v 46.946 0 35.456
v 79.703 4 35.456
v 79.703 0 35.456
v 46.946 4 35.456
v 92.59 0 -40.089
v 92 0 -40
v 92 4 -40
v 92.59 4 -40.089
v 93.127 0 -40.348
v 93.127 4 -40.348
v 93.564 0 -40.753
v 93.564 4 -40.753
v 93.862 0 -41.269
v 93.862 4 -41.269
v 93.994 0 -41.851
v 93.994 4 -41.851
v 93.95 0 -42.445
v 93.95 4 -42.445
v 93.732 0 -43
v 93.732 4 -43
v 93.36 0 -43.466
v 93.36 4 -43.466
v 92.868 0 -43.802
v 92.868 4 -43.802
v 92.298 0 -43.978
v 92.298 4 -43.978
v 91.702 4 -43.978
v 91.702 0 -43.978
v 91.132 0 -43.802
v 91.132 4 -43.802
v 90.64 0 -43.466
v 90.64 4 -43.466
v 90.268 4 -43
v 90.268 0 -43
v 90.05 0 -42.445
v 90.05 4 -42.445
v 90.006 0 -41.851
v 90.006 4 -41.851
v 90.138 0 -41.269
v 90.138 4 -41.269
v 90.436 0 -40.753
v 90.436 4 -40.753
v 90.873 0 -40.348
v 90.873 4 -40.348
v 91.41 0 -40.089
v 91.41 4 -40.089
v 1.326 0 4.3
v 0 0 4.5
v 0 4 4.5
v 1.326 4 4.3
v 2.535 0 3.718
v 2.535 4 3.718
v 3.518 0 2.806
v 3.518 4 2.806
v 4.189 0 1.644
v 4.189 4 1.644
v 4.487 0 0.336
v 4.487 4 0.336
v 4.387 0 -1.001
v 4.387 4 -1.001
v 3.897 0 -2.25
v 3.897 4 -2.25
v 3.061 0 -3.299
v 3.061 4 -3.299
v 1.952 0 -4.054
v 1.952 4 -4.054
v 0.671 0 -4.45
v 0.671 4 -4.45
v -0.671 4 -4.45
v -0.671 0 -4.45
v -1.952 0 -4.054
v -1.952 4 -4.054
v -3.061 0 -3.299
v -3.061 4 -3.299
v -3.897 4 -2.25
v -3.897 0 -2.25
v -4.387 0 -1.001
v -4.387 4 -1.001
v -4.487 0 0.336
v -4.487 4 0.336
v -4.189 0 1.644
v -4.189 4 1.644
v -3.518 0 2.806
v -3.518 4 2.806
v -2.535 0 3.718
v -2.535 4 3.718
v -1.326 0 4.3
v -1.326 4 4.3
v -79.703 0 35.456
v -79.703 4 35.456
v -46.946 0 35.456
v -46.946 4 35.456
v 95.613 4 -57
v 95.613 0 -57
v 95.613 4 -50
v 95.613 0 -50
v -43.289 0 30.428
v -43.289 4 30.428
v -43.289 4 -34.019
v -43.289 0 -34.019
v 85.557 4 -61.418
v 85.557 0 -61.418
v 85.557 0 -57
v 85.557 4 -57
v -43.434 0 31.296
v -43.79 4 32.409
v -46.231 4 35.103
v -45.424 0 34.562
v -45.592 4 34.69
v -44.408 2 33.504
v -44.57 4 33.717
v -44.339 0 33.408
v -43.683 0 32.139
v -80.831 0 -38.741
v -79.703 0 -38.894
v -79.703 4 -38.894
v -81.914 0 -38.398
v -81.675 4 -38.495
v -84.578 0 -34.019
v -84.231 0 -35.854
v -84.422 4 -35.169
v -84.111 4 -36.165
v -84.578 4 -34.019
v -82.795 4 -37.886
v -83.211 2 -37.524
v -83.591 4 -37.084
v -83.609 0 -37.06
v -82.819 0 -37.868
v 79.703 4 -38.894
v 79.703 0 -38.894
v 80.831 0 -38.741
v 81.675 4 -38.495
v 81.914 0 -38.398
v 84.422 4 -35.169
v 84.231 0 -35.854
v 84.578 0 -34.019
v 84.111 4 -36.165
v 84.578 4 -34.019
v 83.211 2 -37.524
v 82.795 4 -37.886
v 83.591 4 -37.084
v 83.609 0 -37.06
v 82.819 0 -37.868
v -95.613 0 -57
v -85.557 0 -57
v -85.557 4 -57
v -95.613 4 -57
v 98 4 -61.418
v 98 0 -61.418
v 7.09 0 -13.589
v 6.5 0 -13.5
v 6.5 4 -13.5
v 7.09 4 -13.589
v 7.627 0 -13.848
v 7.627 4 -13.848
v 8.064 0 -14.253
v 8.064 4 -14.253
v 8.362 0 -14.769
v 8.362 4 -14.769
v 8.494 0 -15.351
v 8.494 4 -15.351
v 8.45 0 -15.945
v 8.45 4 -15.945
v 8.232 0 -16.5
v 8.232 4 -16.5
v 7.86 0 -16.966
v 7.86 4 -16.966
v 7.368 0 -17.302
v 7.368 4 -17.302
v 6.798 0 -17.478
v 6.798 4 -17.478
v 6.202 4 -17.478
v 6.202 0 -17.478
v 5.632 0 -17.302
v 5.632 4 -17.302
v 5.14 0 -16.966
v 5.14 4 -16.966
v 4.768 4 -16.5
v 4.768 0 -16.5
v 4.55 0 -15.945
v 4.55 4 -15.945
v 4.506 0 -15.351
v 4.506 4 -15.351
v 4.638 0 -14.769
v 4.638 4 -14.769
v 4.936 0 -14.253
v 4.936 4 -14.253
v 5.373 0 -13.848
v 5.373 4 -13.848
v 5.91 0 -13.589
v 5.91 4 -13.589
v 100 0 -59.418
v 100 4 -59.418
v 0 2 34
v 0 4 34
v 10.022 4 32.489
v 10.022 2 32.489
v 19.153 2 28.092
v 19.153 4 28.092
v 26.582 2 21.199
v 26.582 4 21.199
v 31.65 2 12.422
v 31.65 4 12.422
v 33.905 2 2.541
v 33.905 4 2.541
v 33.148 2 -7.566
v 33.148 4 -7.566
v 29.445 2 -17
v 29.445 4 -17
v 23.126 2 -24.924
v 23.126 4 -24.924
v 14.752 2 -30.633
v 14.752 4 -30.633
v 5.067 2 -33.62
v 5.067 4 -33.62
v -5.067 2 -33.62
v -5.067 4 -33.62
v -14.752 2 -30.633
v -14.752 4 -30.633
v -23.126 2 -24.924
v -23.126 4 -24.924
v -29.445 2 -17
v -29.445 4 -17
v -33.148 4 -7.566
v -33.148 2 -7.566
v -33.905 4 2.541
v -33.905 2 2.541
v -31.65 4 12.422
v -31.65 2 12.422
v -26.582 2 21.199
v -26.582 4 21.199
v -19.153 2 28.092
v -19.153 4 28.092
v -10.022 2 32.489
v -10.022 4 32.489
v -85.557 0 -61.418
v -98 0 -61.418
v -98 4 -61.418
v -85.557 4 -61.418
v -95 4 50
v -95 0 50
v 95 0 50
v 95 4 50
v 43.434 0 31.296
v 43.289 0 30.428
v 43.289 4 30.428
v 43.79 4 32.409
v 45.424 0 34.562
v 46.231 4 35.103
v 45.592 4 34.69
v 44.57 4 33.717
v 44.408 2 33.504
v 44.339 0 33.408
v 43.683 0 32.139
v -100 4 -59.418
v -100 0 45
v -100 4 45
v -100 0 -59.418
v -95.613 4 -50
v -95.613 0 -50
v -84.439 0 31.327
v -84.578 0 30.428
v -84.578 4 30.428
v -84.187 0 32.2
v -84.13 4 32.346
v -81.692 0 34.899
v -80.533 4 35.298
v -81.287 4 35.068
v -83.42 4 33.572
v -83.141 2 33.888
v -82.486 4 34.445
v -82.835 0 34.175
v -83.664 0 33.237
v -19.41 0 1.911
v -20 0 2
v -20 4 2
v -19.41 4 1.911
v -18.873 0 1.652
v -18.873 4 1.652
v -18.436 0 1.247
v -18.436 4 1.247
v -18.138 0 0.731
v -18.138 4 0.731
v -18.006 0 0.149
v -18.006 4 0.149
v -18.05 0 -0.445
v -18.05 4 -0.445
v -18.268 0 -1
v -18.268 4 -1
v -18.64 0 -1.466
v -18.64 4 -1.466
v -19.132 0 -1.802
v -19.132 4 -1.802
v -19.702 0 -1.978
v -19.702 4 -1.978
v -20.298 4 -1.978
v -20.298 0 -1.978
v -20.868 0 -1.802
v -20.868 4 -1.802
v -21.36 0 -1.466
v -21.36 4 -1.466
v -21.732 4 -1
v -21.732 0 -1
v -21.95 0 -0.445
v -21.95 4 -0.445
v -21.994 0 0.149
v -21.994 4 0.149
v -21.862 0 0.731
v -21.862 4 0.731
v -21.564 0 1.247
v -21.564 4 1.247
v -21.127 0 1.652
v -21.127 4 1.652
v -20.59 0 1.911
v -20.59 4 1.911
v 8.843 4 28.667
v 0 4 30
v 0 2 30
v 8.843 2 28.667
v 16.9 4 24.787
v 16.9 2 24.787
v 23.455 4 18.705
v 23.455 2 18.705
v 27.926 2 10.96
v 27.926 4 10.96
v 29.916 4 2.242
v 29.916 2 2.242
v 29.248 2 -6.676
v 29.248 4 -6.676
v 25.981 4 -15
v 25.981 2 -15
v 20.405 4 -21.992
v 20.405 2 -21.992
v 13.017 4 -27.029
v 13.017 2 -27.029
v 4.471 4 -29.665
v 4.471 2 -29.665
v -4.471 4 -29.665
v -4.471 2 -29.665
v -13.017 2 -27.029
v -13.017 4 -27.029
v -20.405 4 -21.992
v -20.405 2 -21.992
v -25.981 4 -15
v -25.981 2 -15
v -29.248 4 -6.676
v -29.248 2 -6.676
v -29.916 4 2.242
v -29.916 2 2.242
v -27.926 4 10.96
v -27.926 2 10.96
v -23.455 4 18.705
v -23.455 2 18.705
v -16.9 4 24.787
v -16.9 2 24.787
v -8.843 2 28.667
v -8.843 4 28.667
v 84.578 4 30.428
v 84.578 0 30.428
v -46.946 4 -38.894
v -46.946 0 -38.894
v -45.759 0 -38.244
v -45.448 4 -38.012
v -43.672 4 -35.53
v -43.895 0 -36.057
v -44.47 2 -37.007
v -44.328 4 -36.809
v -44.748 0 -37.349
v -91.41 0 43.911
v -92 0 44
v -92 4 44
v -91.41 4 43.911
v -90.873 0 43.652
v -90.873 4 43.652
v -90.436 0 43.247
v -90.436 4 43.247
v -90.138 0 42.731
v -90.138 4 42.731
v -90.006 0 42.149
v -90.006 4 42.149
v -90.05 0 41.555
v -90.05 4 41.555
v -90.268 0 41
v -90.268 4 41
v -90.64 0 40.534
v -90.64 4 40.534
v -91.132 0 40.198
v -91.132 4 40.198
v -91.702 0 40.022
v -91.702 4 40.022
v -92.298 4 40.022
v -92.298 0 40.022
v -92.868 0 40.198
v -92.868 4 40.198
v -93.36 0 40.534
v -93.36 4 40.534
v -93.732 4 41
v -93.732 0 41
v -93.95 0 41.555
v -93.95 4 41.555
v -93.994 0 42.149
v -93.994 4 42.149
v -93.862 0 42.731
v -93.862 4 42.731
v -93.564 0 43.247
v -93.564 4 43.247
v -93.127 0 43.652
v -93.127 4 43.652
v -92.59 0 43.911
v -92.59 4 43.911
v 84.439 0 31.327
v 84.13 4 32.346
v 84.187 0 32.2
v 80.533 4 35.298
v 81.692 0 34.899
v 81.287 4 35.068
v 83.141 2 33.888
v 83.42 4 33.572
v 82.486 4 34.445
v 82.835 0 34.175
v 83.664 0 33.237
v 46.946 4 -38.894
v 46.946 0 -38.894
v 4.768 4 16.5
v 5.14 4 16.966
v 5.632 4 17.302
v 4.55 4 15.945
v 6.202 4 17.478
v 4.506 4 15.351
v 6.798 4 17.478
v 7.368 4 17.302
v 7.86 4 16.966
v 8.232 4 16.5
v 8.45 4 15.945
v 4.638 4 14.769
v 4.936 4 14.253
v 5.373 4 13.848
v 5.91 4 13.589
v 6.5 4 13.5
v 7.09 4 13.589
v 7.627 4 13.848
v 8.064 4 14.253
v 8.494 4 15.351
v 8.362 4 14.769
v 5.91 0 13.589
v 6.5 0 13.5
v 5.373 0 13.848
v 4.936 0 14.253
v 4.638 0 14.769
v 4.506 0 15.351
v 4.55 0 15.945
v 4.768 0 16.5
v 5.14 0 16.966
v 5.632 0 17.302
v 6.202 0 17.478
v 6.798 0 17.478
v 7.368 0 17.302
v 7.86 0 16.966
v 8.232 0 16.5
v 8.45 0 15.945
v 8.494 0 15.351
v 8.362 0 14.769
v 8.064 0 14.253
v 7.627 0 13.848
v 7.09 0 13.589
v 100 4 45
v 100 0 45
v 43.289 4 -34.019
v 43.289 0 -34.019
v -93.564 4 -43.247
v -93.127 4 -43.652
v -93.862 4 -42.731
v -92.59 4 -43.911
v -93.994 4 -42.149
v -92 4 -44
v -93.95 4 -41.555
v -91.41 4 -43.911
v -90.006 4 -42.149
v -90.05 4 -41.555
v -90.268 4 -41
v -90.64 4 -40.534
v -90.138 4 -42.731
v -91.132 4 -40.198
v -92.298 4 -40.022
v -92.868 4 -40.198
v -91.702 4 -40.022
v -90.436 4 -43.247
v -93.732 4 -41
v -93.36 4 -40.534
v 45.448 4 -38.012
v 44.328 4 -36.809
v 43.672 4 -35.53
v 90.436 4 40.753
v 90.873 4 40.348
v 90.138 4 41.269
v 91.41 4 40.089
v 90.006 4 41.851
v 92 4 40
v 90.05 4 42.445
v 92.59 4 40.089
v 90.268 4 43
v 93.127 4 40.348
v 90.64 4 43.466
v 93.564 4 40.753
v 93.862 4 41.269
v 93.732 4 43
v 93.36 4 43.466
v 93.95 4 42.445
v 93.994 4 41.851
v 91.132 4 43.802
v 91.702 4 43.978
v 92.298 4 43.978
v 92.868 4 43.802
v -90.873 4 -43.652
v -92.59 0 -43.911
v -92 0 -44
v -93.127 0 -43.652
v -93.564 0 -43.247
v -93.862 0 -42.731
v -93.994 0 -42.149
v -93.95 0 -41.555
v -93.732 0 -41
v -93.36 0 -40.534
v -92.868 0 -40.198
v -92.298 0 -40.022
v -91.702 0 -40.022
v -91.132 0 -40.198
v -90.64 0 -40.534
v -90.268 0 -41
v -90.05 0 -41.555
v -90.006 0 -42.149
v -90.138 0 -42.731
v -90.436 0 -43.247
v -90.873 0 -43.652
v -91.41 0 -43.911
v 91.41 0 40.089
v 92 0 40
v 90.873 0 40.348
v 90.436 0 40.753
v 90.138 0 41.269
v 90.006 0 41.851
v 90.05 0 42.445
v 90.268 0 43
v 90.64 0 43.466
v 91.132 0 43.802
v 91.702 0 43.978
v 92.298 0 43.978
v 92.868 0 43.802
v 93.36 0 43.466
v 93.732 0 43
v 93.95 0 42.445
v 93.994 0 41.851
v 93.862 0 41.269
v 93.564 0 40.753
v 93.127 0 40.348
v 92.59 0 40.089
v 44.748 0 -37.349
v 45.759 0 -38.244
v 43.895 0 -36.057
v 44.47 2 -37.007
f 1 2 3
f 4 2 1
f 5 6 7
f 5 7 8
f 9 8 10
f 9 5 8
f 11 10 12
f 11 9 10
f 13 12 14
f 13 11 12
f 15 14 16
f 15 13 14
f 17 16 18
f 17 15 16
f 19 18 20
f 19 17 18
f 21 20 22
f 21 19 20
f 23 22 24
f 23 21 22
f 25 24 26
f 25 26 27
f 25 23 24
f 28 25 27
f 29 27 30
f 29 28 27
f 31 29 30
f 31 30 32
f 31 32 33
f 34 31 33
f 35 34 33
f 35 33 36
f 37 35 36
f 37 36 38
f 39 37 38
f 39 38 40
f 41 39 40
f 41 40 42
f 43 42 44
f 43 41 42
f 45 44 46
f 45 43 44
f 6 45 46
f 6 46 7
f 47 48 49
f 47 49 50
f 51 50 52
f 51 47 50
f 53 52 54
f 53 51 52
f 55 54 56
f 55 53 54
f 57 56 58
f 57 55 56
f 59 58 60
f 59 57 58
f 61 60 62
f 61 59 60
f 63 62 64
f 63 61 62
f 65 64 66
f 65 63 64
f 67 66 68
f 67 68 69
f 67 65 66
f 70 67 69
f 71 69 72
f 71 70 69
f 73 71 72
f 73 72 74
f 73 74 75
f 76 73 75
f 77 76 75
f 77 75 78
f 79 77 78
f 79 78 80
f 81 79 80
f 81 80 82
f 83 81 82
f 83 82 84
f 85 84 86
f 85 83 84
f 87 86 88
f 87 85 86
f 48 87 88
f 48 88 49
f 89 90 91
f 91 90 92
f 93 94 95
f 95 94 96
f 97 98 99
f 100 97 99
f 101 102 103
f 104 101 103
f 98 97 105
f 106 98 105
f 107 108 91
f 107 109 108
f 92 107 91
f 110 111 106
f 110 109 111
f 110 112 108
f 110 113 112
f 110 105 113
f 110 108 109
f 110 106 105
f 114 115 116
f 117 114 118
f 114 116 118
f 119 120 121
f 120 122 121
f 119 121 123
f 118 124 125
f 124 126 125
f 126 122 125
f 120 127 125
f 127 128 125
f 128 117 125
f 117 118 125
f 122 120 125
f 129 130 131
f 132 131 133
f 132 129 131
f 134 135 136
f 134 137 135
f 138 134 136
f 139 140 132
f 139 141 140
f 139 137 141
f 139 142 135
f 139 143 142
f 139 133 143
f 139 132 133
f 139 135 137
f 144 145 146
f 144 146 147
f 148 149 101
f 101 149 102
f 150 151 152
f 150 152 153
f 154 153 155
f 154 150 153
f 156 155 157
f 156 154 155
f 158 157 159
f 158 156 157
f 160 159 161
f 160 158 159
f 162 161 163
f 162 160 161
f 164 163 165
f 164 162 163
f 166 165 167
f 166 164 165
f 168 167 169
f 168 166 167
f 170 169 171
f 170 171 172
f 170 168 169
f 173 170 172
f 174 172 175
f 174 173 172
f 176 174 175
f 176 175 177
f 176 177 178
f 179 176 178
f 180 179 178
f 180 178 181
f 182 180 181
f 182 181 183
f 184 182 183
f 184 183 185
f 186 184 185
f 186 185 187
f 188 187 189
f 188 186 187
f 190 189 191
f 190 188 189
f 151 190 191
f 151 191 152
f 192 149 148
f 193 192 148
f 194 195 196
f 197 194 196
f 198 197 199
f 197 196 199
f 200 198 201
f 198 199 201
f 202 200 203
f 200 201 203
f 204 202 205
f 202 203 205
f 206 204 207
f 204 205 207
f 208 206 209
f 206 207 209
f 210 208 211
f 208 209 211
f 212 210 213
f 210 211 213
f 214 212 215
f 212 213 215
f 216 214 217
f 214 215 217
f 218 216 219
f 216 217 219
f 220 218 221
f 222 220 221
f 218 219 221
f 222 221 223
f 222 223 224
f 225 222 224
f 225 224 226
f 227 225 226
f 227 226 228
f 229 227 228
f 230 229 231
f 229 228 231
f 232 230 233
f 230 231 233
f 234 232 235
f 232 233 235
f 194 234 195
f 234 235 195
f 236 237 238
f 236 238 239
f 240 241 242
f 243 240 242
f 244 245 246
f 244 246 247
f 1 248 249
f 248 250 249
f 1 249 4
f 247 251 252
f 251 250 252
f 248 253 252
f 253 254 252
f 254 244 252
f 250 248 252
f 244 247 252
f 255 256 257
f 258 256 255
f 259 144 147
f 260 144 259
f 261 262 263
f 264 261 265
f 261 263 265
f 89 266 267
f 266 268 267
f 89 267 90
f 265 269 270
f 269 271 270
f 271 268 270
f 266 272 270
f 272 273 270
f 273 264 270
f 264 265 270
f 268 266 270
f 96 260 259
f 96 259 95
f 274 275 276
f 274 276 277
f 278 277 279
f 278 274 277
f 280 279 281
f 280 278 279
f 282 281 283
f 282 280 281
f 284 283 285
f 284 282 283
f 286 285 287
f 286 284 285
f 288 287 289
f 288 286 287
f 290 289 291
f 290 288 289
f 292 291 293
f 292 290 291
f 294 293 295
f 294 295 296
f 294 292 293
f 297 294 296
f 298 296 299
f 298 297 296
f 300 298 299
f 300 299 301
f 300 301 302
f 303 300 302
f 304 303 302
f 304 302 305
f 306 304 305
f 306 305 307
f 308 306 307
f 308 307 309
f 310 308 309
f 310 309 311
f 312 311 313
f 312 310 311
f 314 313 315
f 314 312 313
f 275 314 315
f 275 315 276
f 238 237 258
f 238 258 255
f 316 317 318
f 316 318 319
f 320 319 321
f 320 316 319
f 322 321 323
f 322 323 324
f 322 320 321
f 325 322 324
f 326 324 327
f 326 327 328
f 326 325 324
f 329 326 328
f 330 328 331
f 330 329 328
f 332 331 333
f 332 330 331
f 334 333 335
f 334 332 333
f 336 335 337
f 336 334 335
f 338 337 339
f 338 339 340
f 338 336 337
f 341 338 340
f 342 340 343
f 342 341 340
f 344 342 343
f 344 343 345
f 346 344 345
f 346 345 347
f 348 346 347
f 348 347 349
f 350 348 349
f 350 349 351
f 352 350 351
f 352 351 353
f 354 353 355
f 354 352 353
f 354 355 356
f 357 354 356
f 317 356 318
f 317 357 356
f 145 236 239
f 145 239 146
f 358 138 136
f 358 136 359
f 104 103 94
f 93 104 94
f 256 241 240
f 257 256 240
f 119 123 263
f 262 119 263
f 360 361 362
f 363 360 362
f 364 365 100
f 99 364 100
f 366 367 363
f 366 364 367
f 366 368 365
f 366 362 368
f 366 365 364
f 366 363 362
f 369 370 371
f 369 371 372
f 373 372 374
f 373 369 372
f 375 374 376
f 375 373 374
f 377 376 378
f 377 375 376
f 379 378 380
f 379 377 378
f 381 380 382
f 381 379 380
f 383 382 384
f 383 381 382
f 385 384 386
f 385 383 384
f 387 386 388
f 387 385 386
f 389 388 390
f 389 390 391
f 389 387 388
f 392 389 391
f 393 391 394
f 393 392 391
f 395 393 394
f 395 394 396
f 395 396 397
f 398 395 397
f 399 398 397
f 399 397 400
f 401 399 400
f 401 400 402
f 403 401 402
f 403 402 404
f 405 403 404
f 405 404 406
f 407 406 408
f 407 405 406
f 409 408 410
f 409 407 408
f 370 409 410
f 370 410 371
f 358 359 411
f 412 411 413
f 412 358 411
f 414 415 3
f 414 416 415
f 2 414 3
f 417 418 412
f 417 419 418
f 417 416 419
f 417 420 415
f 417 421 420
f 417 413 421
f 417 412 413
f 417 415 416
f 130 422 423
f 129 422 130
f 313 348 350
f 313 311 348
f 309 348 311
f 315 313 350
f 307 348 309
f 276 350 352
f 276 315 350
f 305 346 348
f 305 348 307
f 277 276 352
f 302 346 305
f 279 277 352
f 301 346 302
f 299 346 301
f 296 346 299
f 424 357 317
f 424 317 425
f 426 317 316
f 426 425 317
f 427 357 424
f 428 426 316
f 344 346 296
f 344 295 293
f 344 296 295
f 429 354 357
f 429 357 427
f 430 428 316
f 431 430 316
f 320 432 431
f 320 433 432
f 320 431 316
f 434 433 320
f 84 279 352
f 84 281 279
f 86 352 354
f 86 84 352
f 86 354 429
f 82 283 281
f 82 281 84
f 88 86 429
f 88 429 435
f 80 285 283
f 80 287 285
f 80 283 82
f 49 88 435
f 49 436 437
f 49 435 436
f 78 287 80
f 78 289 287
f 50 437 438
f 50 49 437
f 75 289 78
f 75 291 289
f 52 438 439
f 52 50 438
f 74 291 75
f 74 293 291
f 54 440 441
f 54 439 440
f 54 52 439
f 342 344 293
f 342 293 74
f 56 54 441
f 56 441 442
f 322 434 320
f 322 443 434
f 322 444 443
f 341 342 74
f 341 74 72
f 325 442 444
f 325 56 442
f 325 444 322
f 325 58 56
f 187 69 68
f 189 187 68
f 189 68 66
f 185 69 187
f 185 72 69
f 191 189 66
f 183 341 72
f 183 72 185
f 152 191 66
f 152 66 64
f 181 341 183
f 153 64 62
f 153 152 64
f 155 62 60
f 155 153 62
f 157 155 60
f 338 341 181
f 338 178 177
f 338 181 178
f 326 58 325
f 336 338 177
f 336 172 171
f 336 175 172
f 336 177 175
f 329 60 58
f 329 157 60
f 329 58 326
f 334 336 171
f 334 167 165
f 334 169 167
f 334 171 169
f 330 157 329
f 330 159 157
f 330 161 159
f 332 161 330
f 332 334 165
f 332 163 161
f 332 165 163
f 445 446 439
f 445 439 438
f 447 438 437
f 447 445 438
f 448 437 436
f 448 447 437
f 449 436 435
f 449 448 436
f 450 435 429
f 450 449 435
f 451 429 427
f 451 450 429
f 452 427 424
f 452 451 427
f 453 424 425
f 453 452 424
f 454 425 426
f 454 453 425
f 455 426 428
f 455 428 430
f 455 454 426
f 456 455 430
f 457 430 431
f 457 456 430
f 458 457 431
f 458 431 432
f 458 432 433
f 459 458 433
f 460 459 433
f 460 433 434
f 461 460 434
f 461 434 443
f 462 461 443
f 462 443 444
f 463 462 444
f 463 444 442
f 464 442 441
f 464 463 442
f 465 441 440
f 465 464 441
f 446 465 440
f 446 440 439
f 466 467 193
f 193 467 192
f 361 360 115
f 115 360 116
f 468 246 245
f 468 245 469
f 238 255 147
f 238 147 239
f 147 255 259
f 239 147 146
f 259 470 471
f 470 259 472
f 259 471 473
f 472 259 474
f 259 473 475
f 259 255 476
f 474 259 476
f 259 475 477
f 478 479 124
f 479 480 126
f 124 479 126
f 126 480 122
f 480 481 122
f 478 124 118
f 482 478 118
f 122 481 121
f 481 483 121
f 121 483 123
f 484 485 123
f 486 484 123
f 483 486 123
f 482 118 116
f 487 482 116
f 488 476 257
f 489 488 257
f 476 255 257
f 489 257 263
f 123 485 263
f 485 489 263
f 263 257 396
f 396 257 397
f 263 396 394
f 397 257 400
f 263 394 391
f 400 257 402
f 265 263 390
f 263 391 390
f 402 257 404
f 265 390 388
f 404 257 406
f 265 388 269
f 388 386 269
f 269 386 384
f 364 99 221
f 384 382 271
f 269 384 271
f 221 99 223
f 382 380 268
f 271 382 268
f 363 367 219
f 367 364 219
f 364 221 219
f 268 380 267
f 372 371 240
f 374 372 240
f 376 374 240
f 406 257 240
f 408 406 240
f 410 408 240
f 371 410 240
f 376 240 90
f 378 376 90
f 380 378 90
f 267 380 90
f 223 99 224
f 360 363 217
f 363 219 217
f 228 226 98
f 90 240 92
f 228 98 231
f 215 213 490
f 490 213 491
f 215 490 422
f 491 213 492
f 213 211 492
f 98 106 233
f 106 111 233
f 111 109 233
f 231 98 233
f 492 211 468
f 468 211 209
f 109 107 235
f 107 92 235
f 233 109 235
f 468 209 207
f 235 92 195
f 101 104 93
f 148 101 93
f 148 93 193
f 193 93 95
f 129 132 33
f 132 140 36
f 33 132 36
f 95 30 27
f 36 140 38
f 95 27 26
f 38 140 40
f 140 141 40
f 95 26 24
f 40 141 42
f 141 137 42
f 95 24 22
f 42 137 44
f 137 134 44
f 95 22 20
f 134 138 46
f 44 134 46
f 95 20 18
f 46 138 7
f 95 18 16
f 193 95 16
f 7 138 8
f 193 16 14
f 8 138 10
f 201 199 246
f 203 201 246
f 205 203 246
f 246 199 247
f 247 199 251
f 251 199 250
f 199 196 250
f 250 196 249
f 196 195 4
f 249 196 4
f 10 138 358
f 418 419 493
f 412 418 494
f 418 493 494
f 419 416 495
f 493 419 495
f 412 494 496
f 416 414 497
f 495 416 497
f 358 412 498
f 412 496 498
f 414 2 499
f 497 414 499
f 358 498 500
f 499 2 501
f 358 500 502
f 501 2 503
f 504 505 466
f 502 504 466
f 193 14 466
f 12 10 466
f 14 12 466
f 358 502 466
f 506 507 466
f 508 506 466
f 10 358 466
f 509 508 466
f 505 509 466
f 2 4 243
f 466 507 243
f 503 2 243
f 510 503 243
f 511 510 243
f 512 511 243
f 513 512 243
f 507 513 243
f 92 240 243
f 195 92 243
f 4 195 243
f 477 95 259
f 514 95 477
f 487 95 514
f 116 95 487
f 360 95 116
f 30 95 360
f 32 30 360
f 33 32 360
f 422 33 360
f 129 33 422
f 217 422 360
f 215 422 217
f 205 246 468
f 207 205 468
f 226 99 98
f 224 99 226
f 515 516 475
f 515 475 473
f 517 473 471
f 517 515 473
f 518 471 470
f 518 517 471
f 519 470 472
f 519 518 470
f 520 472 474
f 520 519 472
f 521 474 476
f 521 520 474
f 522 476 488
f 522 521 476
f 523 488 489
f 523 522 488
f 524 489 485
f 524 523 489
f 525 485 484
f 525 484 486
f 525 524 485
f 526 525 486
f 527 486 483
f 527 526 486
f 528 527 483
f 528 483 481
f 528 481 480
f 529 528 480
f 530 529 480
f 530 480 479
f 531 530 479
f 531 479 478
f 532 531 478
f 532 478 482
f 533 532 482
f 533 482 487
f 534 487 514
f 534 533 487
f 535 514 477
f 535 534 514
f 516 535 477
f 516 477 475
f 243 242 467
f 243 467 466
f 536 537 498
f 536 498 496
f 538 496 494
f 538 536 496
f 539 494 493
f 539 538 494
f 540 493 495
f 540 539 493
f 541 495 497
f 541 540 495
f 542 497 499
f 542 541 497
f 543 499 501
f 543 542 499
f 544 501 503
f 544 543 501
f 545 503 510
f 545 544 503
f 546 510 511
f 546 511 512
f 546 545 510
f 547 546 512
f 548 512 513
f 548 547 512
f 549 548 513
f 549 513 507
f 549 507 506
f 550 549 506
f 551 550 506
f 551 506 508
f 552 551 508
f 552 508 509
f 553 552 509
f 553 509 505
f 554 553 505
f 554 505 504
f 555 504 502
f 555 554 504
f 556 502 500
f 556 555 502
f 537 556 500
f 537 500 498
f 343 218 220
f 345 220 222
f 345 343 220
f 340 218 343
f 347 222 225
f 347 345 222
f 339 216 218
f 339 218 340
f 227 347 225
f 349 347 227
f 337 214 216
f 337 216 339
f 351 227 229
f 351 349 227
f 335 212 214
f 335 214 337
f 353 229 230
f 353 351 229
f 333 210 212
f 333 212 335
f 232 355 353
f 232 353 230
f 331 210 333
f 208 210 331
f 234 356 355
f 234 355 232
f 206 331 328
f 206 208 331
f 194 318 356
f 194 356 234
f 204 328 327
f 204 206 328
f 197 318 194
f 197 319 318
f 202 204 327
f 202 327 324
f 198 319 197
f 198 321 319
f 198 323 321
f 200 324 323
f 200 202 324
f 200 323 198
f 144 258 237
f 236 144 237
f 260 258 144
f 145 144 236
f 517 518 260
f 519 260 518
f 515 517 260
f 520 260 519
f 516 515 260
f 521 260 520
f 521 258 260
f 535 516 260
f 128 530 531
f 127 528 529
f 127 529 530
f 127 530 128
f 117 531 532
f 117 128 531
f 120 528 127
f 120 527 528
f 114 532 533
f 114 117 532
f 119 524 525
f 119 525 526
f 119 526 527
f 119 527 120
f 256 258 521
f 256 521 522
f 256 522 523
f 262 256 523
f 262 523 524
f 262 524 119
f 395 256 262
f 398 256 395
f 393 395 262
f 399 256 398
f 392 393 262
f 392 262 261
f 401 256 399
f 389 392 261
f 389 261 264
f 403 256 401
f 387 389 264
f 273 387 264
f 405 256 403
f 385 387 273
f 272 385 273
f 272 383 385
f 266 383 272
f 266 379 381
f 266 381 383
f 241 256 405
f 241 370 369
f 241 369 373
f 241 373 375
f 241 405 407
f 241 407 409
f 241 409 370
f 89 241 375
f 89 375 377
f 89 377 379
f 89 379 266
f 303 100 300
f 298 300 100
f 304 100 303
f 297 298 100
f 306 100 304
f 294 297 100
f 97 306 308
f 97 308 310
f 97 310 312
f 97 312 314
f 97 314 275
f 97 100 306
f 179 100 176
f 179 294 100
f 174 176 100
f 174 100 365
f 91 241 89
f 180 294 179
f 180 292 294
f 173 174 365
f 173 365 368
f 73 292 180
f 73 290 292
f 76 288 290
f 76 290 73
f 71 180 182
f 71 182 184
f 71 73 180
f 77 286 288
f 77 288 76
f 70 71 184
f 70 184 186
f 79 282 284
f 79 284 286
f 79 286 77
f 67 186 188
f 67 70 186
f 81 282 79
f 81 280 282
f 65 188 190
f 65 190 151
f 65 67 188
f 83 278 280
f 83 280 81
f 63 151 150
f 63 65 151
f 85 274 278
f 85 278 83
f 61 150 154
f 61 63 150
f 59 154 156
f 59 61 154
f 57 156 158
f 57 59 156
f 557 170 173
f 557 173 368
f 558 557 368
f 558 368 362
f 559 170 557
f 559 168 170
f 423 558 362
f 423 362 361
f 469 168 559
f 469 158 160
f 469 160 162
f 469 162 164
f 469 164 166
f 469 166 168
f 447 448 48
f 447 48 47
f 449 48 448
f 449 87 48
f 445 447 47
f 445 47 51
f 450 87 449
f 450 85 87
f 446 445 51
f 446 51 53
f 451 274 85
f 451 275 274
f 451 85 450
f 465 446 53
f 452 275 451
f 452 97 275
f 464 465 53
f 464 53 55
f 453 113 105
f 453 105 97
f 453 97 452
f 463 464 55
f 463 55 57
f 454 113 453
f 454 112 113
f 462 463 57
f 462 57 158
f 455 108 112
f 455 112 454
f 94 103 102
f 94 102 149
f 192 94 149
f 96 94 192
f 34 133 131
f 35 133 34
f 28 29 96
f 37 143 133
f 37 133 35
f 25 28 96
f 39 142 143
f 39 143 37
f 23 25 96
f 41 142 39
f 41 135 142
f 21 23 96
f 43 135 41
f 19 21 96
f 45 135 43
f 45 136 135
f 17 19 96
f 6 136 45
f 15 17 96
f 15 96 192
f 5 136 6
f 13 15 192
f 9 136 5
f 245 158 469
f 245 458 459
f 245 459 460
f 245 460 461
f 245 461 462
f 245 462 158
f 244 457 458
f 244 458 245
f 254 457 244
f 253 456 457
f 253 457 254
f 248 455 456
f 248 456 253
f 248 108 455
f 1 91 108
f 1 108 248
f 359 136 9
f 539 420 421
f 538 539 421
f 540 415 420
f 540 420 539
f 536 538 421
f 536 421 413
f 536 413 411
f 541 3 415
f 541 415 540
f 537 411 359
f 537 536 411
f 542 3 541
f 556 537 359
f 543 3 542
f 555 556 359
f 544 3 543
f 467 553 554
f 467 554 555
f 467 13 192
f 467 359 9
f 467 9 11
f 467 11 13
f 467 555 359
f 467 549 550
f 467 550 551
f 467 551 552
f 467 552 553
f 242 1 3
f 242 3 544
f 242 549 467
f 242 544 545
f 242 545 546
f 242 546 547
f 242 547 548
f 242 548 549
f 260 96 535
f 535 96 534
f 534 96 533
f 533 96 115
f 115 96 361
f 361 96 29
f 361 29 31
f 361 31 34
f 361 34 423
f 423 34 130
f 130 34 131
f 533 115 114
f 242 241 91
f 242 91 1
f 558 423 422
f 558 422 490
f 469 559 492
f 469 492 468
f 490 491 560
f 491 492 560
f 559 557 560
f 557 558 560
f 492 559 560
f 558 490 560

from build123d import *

# Parameters (mm, degrees)
ESQUISSE2_W             = 200
ESQUISSE2_H             = 100
ESQUISSE2_R             = 4.5
ESQUISSE2_R_2           = 2
BOSS_EXTRU_1_DEPTH      = 4
ESQUISSE3_R             = 34
ESQUISSE3_R_2           = 30
ENL_V_MAT_EXTRU_1_DEPTH = 2
ENL_V_MAT_EXTRU_2_DEPTH = 10
BOSS_EXTRU_2_DEPTH      = 4
CHANFREIN1_SIZE         = 5
CHANFREIN2_SIZE         = 2


with BuildPart() as part:
    # Esquisse2 → Boss.-Extru.1 (new body)
    with BuildSketch(Plane(origin=(0, 0, 0), x_dir=(1, 0, 0), z_dir=(0, 1, 0))):
        Rectangle(ESQUISSE2_W, ESQUISSE2_H)
        with Locations(Location((0, 0, 0), (0, 0, 270))):
            Circle(ESQUISSE2_R, mode=Mode.SUBTRACT)
        with Locations(Location((6.5, 15.5, 0), (0, 0, 270))):
            Circle(ESQUISSE2_R_2, mode=Mode.SUBTRACT)
        with Locations(Location((6.5, -15.5, 0), (0, 0, 90))):
            Circle(ESQUISSE2_R_2, mode=Mode.SUBTRACT)
        with Locations(Location((-20, 0, 0), (0, 0, 270))):
            Circle(ESQUISSE2_R_2, mode=Mode.SUBTRACT)
        with Locations(Location((92, 42, 0), (0, 0, 270))):
            Circle(ESQUISSE2_R_2, mode=Mode.SUBTRACT)
        with Locations(Location((-92, 42, 0), (0, 0, 90))):
            Circle(ESQUISSE2_R_2, mode=Mode.SUBTRACT)
        with Locations(Location((-92, -42, 0), (0, 0, 270))):
            Circle(ESQUISSE2_R_2, mode=Mode.SUBTRACT)
        with Locations(Location((92, -42, 0), (0, 0, 90))):
            Circle(ESQUISSE2_R_2, mode=Mode.SUBTRACT)
    extrude(amount=BOSS_EXTRU_1_DEPTH)

    # Esquisse3 → Enlèv. mat.-Extru.1 (cut)
    with BuildSketch(Plane(origin=(0, 4, 0), x_dir=(1, 0, 0), z_dir=(0, 1, 0))):
        with Locations(Location((0, 0, 0), (0, 0, 270))):
            Circle(ESQUISSE3_R)
        with Locations(Location((0, 0, 0), (0, 0, 270))):
            Circle(ESQUISSE3_R_2, mode=Mode.SUBTRACT)
    extrude(amount=-ENL_V_MAT_EXTRU_1_DEPTH, mode=Mode.SUBTRACT)

    # Esquisse4 → Enlèv. mat.-Extru.2 (cut)
    with BuildSketch(Plane(origin=(0, 4, 0), x_dir=(1, 0, 0), z_dir=(0, 1, 0))):
        with BuildLine():
            Line((-84.578253972, 34.018938554), (-84.578253972, -30.428285652))
            add(Edge.make_bspline(
                [(-84.578253972, -30.428285652), (-84.141978558, -34.833934515), (-79.702813843, -35.456083285)],
                knots=[0, 0, 0, 1, 1, 1], degree=2))
            Line((-79.702813843, -35.456083285), (-46.945950476, -35.456083285))
            add(Edge.make_bspline(
                [(-43.289370379, -30.428285652), (-43.697579242, -34.066767069), (-46.945950476, -35.456083285)],
                knots=[0, 0, 0, 1, 1, 1], degree=2))
            Line((-43.289370379, -30.428285652), (-43.289370379, 34.018938554))
            add(Edge.make_bspline(
                [(-46.945950476, 38.894378683), (-43.822752081, 37.558044403), (-43.289370379, 34.018938554)],
                knots=[0, 0, 0, 1, 1, 1], degree=2))
            Line((-46.945950476, 38.894378683), (-79.702813843, 38.894378683))
            add(Edge.make_bspline(
                [(-79.702813843, 38.894378683), (-84.282201555, 38.592094199), (-84.578253972, 34.018938554)],
                knots=[0, 0, 0, 1, 1, 1], degree=2))
        make_face()
        with BuildLine():
            Line((79.702813843, -35.456083285), (46.945950476, -35.456083285))
            add(Edge.make_bspline(
                [(43.289370379, -30.428285652), (43.697579242, -34.066767069), (46.945950476, -35.456083285)],
                knots=[0, 0, 0, 1, 1, 1], degree=2))
            Line((43.289370379, -30.428285652), (43.289370379, 34.018938554))
            add(Edge.make_bspline(
                [(46.945950476, 38.894378683), (43.822752081, 37.558044403), (43.289370379, 34.018938554)],
                knots=[0, 0, 0, 1, 1, 1], degree=2))
            Line((46.945950476, 38.894378683), (79.702813843, 38.894378683))
            add(Edge.make_bspline(
                [(79.702813843, 38.894378683), (84.282201555, 38.592094199), (84.578253972, 34.018938554)],
                knots=[0, 0, 0, 1, 1, 1], degree=2))
            Line((84.578253972, 34.018938554), (84.578253972, -30.428285652))
            add(Edge.make_bspline(
                [(84.578253972, -30.428285652), (84.141978558, -34.833934515), (79.702813843, -35.456083285)],
                knots=[0, 0, 0, 1, 1, 1], degree=2))
        make_face()
    extrude(amount=-ENL_V_MAT_EXTRU_2_DEPTH, mode=Mode.SUBTRACT)

    # Esquisse5 → Boss.-Extru.2 (add)
    with BuildSketch(Plane.XZ):
        Polygon((100, -50), (100, -61.418367617), (85.556933512, -61.418367617), (85.556933512, -57), (95.612528779, -57), (95.612528779, -50), align=None)
    boss_extru_2 = extrude(amount=-BOSS_EXTRU_2_DEPTH)

    # Symétrie1: Boss.-Extru.2 across plane
    add(boss_extru_2.mirror(Plane(origin=(0, 0, 0), x_dir=(0, 0, 1), z_dir=(1, 0, 0))))

    # Chanfrein1
    chanfrein1_edges = [part.edges().sort_by_distance(p)[0] for p in [
        (100, 2, 50),
        (-100, 2, 50),
    ]]
    chamfer(chanfrein1_edges, length=CHANFREIN1_SIZE)

    # Chanfrein2
    chanfrein2_edges = [part.edges().sort_by_distance(p)[0] for p in [
        (100, 2, -61.418367617),
        (-100, 2, -61.418367617),
    ]]
    chamfer(chanfrein2_edges, length=CHANFREIN2_SIZE)


solid = part.part
